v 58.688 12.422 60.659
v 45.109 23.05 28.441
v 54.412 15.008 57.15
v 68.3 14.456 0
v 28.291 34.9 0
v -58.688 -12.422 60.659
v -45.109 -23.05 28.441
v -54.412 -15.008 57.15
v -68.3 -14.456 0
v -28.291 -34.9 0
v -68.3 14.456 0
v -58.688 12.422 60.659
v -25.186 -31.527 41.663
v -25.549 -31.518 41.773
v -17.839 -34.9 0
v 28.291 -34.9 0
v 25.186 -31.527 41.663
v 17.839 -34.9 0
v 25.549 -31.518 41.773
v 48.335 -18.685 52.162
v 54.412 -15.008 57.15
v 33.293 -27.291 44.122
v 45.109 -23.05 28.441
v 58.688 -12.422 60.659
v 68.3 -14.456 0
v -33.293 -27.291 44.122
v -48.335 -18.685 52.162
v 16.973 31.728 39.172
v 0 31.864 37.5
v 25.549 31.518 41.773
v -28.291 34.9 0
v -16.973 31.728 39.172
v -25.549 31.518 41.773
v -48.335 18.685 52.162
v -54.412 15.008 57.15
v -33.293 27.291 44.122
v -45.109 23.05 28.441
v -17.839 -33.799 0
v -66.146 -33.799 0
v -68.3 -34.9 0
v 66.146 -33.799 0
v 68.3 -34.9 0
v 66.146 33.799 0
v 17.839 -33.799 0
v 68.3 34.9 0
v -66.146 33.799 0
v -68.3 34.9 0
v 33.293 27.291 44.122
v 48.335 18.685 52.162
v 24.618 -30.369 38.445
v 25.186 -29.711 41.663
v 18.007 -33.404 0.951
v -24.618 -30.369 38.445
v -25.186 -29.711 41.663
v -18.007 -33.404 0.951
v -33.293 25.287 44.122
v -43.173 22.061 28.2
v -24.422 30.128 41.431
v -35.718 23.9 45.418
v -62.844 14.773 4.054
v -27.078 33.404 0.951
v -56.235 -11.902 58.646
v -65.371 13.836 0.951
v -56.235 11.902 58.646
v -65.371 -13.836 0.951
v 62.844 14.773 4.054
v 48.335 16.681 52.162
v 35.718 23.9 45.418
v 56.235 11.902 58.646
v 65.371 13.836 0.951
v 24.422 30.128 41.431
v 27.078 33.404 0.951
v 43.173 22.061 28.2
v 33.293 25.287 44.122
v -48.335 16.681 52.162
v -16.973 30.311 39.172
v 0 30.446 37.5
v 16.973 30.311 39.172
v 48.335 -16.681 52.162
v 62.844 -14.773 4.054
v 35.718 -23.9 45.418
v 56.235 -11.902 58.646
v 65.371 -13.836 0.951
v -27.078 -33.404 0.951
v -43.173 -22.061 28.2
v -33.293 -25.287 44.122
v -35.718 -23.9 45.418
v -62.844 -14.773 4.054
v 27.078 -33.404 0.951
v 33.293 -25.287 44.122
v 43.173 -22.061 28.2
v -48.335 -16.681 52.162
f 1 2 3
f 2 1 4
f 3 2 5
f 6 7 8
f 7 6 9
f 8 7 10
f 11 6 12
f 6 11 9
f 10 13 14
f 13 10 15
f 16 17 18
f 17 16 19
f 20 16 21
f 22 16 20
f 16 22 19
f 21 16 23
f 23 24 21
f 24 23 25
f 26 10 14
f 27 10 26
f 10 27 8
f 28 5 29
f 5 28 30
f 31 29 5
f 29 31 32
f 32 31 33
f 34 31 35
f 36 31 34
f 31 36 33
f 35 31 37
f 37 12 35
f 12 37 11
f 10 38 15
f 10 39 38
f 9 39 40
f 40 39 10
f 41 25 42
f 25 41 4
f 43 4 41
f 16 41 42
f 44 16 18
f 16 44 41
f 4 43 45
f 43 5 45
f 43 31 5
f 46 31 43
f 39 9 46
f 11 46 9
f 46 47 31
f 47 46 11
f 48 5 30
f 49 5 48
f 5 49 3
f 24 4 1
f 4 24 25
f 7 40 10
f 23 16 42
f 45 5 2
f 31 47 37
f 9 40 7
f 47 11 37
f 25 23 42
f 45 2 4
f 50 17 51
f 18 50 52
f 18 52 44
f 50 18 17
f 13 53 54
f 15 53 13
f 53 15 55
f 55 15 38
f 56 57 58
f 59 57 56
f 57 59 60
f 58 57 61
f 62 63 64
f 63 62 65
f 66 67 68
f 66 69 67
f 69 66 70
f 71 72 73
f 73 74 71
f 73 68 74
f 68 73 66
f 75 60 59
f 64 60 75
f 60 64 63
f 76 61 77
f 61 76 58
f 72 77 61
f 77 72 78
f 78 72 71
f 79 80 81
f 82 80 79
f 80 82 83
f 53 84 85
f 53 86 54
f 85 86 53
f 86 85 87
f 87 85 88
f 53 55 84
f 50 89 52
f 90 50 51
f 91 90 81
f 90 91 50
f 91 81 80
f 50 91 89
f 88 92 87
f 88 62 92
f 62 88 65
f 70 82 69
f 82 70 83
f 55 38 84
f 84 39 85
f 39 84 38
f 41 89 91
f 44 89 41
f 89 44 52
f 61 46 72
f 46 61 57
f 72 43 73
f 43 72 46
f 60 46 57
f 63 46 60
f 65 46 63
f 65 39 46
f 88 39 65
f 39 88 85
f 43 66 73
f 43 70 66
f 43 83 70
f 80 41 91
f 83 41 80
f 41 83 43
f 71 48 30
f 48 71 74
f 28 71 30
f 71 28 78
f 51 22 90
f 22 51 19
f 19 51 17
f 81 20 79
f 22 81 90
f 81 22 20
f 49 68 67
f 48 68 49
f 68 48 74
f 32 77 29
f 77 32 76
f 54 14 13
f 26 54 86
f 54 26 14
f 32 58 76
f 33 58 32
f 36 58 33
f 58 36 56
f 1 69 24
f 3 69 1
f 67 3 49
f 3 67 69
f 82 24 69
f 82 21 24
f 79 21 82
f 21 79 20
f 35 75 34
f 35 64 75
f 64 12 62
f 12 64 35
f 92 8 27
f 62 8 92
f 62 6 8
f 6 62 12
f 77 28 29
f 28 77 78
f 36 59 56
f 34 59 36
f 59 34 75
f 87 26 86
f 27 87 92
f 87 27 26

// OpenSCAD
// Experiment with octogon shape

// Use dimensions for Galaxy S4
//    Dimensions are portrait mode.
phone_width=69.8;
phone_height=136.6;
phone_thickness=7.9;
view_width=65;
view_height=110;

// Potentially user-specific data
face_width=116;
forehead_depth=37.5;
variant="A";

front_width=126;
height=67;
depth=65;
thick=3;

if( variant == "A" )
{
    main_body( phone_height, phone_width, face_width, forehead_depth );
}
else
{
    main_body( front_width, height, face_width, forehead_depth );
}

// Build the body from the pieces
module main_body( fwidth, fheight, face, forehead_depth )
{
    difference()
    {
        union()
        {
            shell_outer( fwidth, fheight, face );
            body_front_outer();
        }
        shell_inner( fwidth, fheight, face );
        body_front_inner();
        face( face, forehead_depth, depth );
        nose_slice( thick );
    }
}

// Define the front rectangular portion of the viewer
module body_front_outer()
{
    scale( [1,phone_width/phone_height,1] )
        polyprism( len=1.2*phone_width/2, bottom=phone_height/2, top=phone_height/4, sides=4 );
}

module body_front_inner()
{
    scale( [1,phone_width/phone_height,1] )
        polyprism_hole( len=1.2*phone_width/2, bottom=phone_height/2, top=phone_height/4, wall=thick, sides=4 );
}

// Define the rear "squashed octagon" portion of the viewer
//  fwidth  - the width of the front of this part of the body
//  fheight - the height of the front of this part of the body
//  face    - width of the face
module shell_outer( fwidth, fheight, face )
{
    scale( [1,fheight/fwidth,1] )
        polyprism( len=depth, bottom=fwidth/2, top=face/2, sides=8 );
}

//  fwidth  - the width of the front of this part of the body
//  fheight - the height of the front of this part of the body
//  face    - width of the face
module shell_inner( fwidth, fheight, face )
{
    scale( [1,fheight/fwidth,1] )
        polyprism_hole( len=depth, bottom=fwidth/2, top=face/2, wall=thick, sides=8 );
}

// Define the portions to remove to fit a face.
// face_width - across forehead
// depth      - distance from forehead touch to temples of viewer
// height     - distance from front to back of viewer
module face( face_width, depth, height )
{
    radius=0.75*face_width;
    translate([0,0,radius+depth]) rotate([90,0,0])
        cylinder( h=1.25*height, r=radius, center=true, $fn=32 );
}

module nose_slice( thickness )
{
    theta=10;
    spread=5.8;
    slice=35;
    translate( [0,-height/2+0.75*thickness,depth/2] )
    union()
    {
        translate([spread,0,0] ) rotate( [0,theta,0] ) cube( [slice, thickness*4, 1.2*depth], center=true );
        translate([-spread,0,0] ) rotate( [0,-theta,0] ) cube( [slice, thickness*4, 1.2*depth], center=true );
    }
}

// Convert polygon opposite face distance to radius
function radius_from_side(dist,sides) = dist/cos(180/sides);

//
//  Polygonal prism centered in x-y, with sitting on z-origin.
//  len - length of prism
//  bottom - bottom radius
//  top - top radius
//  sides - number of sides of the polygon
module polyprism( len, bottom, top, sides )
{
    translate( [0,0,len/2] ) rotate( [0,0,180/sides] )
        cylinder( h=len,
                  r1=radius_from_side( bottom, sides ), r2=radius_from_side( top, sides ),
                  center=true, $fn=sides
        );
}

//
//  Polygonal prism hole, expected to be subtracted from a polyprism
//  len    - length of prism
//  bottom - bottom face-distance
//  top    - top face-distance
//  wall   - thickness of remaining wall
//  sides  - number of sides of the polygon
module polyprism_hole( len, bottom, top, wall, sides )
{
    fudge=0.04;
    translate( [0,0,(len-fudge)/2] ) rotate( [0,0,180/sides] )
        cylinder( h=len+fudge,
                  r1=radius_from_side( bottom, sides )-wall, r2=radius_from_side( top, sides )-wall,
                  center=true, $fn=sides
        );
}
